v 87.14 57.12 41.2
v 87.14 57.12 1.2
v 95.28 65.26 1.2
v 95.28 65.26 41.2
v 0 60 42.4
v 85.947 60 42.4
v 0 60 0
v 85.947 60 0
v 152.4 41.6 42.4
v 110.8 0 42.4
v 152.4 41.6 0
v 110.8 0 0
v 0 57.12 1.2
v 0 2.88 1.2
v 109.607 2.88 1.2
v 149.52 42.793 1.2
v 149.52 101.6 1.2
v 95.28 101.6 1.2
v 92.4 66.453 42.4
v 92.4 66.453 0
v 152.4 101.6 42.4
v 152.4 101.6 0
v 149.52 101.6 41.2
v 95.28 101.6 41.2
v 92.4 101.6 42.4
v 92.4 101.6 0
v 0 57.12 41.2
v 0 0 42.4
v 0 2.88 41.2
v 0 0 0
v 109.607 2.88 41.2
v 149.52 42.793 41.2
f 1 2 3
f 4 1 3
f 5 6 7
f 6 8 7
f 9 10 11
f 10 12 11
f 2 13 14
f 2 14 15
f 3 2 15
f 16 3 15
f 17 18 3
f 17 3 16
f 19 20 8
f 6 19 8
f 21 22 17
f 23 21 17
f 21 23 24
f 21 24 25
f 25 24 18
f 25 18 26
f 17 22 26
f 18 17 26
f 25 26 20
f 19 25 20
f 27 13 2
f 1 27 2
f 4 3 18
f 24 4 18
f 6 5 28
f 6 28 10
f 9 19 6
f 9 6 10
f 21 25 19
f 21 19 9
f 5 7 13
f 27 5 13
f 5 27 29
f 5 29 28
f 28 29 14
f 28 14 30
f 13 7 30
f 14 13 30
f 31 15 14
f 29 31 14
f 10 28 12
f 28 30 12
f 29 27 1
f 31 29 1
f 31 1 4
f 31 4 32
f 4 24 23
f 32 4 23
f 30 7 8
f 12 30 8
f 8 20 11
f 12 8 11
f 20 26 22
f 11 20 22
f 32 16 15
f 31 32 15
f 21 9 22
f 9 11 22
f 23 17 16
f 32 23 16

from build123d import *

# Parameters (mm, degrees)
F1_DEPTH = 1.2
F4_DEPTH = 40
F6_DEPTH = 1.2


with BuildPart() as f1:
    # F0 (on Top) → F1 (new body)
    with BuildSketch(Plane.XY):
        Polygon((0, 60), (0, 0), (110.8, 0), (152.4, 41.6), (152.4, 101.6), (92.4, 101.6), (92.4, 66.452814), (85.947186, 60), align=None)
    extrude(amount=F1_DEPTH)

    # F2 (on face) + F3 (on face) → F4 (join)
    with BuildSketch(Plane.XY.offset(1.2)):
        Polygon((109.607065, 2.88), (0, 2.88), (0, 0), (110.8, 0), (152.4, 41.6), (152.4, 101.6), (149.52, 101.6), (149.52, 42.792935), align=None)
    with BuildSketch(Plane.XY.offset(1.2)):
        Polygon((85.947186, 60), (0, 60), (0, 57.12), (87.140121, 57.12), (95.28, 65.259879), (95.28, 101.6), (92.4, 101.6), (92.4, 66.452814), align=None)
    extrude(amount=F4_DEPTH)

    # F5 (on face) → F6 (join)
    with BuildSketch(Plane.XY.offset(41.2)):
        Polygon((92.4, 66.452814), (85.947186, 60), (0, 60), (0, 0), (110.8, 0), (152.4, 41.6), (152.4, 101.6), (92.4, 101.6), align=None)
    extrude(amount=F6_DEPTH)


solid = f1.part
